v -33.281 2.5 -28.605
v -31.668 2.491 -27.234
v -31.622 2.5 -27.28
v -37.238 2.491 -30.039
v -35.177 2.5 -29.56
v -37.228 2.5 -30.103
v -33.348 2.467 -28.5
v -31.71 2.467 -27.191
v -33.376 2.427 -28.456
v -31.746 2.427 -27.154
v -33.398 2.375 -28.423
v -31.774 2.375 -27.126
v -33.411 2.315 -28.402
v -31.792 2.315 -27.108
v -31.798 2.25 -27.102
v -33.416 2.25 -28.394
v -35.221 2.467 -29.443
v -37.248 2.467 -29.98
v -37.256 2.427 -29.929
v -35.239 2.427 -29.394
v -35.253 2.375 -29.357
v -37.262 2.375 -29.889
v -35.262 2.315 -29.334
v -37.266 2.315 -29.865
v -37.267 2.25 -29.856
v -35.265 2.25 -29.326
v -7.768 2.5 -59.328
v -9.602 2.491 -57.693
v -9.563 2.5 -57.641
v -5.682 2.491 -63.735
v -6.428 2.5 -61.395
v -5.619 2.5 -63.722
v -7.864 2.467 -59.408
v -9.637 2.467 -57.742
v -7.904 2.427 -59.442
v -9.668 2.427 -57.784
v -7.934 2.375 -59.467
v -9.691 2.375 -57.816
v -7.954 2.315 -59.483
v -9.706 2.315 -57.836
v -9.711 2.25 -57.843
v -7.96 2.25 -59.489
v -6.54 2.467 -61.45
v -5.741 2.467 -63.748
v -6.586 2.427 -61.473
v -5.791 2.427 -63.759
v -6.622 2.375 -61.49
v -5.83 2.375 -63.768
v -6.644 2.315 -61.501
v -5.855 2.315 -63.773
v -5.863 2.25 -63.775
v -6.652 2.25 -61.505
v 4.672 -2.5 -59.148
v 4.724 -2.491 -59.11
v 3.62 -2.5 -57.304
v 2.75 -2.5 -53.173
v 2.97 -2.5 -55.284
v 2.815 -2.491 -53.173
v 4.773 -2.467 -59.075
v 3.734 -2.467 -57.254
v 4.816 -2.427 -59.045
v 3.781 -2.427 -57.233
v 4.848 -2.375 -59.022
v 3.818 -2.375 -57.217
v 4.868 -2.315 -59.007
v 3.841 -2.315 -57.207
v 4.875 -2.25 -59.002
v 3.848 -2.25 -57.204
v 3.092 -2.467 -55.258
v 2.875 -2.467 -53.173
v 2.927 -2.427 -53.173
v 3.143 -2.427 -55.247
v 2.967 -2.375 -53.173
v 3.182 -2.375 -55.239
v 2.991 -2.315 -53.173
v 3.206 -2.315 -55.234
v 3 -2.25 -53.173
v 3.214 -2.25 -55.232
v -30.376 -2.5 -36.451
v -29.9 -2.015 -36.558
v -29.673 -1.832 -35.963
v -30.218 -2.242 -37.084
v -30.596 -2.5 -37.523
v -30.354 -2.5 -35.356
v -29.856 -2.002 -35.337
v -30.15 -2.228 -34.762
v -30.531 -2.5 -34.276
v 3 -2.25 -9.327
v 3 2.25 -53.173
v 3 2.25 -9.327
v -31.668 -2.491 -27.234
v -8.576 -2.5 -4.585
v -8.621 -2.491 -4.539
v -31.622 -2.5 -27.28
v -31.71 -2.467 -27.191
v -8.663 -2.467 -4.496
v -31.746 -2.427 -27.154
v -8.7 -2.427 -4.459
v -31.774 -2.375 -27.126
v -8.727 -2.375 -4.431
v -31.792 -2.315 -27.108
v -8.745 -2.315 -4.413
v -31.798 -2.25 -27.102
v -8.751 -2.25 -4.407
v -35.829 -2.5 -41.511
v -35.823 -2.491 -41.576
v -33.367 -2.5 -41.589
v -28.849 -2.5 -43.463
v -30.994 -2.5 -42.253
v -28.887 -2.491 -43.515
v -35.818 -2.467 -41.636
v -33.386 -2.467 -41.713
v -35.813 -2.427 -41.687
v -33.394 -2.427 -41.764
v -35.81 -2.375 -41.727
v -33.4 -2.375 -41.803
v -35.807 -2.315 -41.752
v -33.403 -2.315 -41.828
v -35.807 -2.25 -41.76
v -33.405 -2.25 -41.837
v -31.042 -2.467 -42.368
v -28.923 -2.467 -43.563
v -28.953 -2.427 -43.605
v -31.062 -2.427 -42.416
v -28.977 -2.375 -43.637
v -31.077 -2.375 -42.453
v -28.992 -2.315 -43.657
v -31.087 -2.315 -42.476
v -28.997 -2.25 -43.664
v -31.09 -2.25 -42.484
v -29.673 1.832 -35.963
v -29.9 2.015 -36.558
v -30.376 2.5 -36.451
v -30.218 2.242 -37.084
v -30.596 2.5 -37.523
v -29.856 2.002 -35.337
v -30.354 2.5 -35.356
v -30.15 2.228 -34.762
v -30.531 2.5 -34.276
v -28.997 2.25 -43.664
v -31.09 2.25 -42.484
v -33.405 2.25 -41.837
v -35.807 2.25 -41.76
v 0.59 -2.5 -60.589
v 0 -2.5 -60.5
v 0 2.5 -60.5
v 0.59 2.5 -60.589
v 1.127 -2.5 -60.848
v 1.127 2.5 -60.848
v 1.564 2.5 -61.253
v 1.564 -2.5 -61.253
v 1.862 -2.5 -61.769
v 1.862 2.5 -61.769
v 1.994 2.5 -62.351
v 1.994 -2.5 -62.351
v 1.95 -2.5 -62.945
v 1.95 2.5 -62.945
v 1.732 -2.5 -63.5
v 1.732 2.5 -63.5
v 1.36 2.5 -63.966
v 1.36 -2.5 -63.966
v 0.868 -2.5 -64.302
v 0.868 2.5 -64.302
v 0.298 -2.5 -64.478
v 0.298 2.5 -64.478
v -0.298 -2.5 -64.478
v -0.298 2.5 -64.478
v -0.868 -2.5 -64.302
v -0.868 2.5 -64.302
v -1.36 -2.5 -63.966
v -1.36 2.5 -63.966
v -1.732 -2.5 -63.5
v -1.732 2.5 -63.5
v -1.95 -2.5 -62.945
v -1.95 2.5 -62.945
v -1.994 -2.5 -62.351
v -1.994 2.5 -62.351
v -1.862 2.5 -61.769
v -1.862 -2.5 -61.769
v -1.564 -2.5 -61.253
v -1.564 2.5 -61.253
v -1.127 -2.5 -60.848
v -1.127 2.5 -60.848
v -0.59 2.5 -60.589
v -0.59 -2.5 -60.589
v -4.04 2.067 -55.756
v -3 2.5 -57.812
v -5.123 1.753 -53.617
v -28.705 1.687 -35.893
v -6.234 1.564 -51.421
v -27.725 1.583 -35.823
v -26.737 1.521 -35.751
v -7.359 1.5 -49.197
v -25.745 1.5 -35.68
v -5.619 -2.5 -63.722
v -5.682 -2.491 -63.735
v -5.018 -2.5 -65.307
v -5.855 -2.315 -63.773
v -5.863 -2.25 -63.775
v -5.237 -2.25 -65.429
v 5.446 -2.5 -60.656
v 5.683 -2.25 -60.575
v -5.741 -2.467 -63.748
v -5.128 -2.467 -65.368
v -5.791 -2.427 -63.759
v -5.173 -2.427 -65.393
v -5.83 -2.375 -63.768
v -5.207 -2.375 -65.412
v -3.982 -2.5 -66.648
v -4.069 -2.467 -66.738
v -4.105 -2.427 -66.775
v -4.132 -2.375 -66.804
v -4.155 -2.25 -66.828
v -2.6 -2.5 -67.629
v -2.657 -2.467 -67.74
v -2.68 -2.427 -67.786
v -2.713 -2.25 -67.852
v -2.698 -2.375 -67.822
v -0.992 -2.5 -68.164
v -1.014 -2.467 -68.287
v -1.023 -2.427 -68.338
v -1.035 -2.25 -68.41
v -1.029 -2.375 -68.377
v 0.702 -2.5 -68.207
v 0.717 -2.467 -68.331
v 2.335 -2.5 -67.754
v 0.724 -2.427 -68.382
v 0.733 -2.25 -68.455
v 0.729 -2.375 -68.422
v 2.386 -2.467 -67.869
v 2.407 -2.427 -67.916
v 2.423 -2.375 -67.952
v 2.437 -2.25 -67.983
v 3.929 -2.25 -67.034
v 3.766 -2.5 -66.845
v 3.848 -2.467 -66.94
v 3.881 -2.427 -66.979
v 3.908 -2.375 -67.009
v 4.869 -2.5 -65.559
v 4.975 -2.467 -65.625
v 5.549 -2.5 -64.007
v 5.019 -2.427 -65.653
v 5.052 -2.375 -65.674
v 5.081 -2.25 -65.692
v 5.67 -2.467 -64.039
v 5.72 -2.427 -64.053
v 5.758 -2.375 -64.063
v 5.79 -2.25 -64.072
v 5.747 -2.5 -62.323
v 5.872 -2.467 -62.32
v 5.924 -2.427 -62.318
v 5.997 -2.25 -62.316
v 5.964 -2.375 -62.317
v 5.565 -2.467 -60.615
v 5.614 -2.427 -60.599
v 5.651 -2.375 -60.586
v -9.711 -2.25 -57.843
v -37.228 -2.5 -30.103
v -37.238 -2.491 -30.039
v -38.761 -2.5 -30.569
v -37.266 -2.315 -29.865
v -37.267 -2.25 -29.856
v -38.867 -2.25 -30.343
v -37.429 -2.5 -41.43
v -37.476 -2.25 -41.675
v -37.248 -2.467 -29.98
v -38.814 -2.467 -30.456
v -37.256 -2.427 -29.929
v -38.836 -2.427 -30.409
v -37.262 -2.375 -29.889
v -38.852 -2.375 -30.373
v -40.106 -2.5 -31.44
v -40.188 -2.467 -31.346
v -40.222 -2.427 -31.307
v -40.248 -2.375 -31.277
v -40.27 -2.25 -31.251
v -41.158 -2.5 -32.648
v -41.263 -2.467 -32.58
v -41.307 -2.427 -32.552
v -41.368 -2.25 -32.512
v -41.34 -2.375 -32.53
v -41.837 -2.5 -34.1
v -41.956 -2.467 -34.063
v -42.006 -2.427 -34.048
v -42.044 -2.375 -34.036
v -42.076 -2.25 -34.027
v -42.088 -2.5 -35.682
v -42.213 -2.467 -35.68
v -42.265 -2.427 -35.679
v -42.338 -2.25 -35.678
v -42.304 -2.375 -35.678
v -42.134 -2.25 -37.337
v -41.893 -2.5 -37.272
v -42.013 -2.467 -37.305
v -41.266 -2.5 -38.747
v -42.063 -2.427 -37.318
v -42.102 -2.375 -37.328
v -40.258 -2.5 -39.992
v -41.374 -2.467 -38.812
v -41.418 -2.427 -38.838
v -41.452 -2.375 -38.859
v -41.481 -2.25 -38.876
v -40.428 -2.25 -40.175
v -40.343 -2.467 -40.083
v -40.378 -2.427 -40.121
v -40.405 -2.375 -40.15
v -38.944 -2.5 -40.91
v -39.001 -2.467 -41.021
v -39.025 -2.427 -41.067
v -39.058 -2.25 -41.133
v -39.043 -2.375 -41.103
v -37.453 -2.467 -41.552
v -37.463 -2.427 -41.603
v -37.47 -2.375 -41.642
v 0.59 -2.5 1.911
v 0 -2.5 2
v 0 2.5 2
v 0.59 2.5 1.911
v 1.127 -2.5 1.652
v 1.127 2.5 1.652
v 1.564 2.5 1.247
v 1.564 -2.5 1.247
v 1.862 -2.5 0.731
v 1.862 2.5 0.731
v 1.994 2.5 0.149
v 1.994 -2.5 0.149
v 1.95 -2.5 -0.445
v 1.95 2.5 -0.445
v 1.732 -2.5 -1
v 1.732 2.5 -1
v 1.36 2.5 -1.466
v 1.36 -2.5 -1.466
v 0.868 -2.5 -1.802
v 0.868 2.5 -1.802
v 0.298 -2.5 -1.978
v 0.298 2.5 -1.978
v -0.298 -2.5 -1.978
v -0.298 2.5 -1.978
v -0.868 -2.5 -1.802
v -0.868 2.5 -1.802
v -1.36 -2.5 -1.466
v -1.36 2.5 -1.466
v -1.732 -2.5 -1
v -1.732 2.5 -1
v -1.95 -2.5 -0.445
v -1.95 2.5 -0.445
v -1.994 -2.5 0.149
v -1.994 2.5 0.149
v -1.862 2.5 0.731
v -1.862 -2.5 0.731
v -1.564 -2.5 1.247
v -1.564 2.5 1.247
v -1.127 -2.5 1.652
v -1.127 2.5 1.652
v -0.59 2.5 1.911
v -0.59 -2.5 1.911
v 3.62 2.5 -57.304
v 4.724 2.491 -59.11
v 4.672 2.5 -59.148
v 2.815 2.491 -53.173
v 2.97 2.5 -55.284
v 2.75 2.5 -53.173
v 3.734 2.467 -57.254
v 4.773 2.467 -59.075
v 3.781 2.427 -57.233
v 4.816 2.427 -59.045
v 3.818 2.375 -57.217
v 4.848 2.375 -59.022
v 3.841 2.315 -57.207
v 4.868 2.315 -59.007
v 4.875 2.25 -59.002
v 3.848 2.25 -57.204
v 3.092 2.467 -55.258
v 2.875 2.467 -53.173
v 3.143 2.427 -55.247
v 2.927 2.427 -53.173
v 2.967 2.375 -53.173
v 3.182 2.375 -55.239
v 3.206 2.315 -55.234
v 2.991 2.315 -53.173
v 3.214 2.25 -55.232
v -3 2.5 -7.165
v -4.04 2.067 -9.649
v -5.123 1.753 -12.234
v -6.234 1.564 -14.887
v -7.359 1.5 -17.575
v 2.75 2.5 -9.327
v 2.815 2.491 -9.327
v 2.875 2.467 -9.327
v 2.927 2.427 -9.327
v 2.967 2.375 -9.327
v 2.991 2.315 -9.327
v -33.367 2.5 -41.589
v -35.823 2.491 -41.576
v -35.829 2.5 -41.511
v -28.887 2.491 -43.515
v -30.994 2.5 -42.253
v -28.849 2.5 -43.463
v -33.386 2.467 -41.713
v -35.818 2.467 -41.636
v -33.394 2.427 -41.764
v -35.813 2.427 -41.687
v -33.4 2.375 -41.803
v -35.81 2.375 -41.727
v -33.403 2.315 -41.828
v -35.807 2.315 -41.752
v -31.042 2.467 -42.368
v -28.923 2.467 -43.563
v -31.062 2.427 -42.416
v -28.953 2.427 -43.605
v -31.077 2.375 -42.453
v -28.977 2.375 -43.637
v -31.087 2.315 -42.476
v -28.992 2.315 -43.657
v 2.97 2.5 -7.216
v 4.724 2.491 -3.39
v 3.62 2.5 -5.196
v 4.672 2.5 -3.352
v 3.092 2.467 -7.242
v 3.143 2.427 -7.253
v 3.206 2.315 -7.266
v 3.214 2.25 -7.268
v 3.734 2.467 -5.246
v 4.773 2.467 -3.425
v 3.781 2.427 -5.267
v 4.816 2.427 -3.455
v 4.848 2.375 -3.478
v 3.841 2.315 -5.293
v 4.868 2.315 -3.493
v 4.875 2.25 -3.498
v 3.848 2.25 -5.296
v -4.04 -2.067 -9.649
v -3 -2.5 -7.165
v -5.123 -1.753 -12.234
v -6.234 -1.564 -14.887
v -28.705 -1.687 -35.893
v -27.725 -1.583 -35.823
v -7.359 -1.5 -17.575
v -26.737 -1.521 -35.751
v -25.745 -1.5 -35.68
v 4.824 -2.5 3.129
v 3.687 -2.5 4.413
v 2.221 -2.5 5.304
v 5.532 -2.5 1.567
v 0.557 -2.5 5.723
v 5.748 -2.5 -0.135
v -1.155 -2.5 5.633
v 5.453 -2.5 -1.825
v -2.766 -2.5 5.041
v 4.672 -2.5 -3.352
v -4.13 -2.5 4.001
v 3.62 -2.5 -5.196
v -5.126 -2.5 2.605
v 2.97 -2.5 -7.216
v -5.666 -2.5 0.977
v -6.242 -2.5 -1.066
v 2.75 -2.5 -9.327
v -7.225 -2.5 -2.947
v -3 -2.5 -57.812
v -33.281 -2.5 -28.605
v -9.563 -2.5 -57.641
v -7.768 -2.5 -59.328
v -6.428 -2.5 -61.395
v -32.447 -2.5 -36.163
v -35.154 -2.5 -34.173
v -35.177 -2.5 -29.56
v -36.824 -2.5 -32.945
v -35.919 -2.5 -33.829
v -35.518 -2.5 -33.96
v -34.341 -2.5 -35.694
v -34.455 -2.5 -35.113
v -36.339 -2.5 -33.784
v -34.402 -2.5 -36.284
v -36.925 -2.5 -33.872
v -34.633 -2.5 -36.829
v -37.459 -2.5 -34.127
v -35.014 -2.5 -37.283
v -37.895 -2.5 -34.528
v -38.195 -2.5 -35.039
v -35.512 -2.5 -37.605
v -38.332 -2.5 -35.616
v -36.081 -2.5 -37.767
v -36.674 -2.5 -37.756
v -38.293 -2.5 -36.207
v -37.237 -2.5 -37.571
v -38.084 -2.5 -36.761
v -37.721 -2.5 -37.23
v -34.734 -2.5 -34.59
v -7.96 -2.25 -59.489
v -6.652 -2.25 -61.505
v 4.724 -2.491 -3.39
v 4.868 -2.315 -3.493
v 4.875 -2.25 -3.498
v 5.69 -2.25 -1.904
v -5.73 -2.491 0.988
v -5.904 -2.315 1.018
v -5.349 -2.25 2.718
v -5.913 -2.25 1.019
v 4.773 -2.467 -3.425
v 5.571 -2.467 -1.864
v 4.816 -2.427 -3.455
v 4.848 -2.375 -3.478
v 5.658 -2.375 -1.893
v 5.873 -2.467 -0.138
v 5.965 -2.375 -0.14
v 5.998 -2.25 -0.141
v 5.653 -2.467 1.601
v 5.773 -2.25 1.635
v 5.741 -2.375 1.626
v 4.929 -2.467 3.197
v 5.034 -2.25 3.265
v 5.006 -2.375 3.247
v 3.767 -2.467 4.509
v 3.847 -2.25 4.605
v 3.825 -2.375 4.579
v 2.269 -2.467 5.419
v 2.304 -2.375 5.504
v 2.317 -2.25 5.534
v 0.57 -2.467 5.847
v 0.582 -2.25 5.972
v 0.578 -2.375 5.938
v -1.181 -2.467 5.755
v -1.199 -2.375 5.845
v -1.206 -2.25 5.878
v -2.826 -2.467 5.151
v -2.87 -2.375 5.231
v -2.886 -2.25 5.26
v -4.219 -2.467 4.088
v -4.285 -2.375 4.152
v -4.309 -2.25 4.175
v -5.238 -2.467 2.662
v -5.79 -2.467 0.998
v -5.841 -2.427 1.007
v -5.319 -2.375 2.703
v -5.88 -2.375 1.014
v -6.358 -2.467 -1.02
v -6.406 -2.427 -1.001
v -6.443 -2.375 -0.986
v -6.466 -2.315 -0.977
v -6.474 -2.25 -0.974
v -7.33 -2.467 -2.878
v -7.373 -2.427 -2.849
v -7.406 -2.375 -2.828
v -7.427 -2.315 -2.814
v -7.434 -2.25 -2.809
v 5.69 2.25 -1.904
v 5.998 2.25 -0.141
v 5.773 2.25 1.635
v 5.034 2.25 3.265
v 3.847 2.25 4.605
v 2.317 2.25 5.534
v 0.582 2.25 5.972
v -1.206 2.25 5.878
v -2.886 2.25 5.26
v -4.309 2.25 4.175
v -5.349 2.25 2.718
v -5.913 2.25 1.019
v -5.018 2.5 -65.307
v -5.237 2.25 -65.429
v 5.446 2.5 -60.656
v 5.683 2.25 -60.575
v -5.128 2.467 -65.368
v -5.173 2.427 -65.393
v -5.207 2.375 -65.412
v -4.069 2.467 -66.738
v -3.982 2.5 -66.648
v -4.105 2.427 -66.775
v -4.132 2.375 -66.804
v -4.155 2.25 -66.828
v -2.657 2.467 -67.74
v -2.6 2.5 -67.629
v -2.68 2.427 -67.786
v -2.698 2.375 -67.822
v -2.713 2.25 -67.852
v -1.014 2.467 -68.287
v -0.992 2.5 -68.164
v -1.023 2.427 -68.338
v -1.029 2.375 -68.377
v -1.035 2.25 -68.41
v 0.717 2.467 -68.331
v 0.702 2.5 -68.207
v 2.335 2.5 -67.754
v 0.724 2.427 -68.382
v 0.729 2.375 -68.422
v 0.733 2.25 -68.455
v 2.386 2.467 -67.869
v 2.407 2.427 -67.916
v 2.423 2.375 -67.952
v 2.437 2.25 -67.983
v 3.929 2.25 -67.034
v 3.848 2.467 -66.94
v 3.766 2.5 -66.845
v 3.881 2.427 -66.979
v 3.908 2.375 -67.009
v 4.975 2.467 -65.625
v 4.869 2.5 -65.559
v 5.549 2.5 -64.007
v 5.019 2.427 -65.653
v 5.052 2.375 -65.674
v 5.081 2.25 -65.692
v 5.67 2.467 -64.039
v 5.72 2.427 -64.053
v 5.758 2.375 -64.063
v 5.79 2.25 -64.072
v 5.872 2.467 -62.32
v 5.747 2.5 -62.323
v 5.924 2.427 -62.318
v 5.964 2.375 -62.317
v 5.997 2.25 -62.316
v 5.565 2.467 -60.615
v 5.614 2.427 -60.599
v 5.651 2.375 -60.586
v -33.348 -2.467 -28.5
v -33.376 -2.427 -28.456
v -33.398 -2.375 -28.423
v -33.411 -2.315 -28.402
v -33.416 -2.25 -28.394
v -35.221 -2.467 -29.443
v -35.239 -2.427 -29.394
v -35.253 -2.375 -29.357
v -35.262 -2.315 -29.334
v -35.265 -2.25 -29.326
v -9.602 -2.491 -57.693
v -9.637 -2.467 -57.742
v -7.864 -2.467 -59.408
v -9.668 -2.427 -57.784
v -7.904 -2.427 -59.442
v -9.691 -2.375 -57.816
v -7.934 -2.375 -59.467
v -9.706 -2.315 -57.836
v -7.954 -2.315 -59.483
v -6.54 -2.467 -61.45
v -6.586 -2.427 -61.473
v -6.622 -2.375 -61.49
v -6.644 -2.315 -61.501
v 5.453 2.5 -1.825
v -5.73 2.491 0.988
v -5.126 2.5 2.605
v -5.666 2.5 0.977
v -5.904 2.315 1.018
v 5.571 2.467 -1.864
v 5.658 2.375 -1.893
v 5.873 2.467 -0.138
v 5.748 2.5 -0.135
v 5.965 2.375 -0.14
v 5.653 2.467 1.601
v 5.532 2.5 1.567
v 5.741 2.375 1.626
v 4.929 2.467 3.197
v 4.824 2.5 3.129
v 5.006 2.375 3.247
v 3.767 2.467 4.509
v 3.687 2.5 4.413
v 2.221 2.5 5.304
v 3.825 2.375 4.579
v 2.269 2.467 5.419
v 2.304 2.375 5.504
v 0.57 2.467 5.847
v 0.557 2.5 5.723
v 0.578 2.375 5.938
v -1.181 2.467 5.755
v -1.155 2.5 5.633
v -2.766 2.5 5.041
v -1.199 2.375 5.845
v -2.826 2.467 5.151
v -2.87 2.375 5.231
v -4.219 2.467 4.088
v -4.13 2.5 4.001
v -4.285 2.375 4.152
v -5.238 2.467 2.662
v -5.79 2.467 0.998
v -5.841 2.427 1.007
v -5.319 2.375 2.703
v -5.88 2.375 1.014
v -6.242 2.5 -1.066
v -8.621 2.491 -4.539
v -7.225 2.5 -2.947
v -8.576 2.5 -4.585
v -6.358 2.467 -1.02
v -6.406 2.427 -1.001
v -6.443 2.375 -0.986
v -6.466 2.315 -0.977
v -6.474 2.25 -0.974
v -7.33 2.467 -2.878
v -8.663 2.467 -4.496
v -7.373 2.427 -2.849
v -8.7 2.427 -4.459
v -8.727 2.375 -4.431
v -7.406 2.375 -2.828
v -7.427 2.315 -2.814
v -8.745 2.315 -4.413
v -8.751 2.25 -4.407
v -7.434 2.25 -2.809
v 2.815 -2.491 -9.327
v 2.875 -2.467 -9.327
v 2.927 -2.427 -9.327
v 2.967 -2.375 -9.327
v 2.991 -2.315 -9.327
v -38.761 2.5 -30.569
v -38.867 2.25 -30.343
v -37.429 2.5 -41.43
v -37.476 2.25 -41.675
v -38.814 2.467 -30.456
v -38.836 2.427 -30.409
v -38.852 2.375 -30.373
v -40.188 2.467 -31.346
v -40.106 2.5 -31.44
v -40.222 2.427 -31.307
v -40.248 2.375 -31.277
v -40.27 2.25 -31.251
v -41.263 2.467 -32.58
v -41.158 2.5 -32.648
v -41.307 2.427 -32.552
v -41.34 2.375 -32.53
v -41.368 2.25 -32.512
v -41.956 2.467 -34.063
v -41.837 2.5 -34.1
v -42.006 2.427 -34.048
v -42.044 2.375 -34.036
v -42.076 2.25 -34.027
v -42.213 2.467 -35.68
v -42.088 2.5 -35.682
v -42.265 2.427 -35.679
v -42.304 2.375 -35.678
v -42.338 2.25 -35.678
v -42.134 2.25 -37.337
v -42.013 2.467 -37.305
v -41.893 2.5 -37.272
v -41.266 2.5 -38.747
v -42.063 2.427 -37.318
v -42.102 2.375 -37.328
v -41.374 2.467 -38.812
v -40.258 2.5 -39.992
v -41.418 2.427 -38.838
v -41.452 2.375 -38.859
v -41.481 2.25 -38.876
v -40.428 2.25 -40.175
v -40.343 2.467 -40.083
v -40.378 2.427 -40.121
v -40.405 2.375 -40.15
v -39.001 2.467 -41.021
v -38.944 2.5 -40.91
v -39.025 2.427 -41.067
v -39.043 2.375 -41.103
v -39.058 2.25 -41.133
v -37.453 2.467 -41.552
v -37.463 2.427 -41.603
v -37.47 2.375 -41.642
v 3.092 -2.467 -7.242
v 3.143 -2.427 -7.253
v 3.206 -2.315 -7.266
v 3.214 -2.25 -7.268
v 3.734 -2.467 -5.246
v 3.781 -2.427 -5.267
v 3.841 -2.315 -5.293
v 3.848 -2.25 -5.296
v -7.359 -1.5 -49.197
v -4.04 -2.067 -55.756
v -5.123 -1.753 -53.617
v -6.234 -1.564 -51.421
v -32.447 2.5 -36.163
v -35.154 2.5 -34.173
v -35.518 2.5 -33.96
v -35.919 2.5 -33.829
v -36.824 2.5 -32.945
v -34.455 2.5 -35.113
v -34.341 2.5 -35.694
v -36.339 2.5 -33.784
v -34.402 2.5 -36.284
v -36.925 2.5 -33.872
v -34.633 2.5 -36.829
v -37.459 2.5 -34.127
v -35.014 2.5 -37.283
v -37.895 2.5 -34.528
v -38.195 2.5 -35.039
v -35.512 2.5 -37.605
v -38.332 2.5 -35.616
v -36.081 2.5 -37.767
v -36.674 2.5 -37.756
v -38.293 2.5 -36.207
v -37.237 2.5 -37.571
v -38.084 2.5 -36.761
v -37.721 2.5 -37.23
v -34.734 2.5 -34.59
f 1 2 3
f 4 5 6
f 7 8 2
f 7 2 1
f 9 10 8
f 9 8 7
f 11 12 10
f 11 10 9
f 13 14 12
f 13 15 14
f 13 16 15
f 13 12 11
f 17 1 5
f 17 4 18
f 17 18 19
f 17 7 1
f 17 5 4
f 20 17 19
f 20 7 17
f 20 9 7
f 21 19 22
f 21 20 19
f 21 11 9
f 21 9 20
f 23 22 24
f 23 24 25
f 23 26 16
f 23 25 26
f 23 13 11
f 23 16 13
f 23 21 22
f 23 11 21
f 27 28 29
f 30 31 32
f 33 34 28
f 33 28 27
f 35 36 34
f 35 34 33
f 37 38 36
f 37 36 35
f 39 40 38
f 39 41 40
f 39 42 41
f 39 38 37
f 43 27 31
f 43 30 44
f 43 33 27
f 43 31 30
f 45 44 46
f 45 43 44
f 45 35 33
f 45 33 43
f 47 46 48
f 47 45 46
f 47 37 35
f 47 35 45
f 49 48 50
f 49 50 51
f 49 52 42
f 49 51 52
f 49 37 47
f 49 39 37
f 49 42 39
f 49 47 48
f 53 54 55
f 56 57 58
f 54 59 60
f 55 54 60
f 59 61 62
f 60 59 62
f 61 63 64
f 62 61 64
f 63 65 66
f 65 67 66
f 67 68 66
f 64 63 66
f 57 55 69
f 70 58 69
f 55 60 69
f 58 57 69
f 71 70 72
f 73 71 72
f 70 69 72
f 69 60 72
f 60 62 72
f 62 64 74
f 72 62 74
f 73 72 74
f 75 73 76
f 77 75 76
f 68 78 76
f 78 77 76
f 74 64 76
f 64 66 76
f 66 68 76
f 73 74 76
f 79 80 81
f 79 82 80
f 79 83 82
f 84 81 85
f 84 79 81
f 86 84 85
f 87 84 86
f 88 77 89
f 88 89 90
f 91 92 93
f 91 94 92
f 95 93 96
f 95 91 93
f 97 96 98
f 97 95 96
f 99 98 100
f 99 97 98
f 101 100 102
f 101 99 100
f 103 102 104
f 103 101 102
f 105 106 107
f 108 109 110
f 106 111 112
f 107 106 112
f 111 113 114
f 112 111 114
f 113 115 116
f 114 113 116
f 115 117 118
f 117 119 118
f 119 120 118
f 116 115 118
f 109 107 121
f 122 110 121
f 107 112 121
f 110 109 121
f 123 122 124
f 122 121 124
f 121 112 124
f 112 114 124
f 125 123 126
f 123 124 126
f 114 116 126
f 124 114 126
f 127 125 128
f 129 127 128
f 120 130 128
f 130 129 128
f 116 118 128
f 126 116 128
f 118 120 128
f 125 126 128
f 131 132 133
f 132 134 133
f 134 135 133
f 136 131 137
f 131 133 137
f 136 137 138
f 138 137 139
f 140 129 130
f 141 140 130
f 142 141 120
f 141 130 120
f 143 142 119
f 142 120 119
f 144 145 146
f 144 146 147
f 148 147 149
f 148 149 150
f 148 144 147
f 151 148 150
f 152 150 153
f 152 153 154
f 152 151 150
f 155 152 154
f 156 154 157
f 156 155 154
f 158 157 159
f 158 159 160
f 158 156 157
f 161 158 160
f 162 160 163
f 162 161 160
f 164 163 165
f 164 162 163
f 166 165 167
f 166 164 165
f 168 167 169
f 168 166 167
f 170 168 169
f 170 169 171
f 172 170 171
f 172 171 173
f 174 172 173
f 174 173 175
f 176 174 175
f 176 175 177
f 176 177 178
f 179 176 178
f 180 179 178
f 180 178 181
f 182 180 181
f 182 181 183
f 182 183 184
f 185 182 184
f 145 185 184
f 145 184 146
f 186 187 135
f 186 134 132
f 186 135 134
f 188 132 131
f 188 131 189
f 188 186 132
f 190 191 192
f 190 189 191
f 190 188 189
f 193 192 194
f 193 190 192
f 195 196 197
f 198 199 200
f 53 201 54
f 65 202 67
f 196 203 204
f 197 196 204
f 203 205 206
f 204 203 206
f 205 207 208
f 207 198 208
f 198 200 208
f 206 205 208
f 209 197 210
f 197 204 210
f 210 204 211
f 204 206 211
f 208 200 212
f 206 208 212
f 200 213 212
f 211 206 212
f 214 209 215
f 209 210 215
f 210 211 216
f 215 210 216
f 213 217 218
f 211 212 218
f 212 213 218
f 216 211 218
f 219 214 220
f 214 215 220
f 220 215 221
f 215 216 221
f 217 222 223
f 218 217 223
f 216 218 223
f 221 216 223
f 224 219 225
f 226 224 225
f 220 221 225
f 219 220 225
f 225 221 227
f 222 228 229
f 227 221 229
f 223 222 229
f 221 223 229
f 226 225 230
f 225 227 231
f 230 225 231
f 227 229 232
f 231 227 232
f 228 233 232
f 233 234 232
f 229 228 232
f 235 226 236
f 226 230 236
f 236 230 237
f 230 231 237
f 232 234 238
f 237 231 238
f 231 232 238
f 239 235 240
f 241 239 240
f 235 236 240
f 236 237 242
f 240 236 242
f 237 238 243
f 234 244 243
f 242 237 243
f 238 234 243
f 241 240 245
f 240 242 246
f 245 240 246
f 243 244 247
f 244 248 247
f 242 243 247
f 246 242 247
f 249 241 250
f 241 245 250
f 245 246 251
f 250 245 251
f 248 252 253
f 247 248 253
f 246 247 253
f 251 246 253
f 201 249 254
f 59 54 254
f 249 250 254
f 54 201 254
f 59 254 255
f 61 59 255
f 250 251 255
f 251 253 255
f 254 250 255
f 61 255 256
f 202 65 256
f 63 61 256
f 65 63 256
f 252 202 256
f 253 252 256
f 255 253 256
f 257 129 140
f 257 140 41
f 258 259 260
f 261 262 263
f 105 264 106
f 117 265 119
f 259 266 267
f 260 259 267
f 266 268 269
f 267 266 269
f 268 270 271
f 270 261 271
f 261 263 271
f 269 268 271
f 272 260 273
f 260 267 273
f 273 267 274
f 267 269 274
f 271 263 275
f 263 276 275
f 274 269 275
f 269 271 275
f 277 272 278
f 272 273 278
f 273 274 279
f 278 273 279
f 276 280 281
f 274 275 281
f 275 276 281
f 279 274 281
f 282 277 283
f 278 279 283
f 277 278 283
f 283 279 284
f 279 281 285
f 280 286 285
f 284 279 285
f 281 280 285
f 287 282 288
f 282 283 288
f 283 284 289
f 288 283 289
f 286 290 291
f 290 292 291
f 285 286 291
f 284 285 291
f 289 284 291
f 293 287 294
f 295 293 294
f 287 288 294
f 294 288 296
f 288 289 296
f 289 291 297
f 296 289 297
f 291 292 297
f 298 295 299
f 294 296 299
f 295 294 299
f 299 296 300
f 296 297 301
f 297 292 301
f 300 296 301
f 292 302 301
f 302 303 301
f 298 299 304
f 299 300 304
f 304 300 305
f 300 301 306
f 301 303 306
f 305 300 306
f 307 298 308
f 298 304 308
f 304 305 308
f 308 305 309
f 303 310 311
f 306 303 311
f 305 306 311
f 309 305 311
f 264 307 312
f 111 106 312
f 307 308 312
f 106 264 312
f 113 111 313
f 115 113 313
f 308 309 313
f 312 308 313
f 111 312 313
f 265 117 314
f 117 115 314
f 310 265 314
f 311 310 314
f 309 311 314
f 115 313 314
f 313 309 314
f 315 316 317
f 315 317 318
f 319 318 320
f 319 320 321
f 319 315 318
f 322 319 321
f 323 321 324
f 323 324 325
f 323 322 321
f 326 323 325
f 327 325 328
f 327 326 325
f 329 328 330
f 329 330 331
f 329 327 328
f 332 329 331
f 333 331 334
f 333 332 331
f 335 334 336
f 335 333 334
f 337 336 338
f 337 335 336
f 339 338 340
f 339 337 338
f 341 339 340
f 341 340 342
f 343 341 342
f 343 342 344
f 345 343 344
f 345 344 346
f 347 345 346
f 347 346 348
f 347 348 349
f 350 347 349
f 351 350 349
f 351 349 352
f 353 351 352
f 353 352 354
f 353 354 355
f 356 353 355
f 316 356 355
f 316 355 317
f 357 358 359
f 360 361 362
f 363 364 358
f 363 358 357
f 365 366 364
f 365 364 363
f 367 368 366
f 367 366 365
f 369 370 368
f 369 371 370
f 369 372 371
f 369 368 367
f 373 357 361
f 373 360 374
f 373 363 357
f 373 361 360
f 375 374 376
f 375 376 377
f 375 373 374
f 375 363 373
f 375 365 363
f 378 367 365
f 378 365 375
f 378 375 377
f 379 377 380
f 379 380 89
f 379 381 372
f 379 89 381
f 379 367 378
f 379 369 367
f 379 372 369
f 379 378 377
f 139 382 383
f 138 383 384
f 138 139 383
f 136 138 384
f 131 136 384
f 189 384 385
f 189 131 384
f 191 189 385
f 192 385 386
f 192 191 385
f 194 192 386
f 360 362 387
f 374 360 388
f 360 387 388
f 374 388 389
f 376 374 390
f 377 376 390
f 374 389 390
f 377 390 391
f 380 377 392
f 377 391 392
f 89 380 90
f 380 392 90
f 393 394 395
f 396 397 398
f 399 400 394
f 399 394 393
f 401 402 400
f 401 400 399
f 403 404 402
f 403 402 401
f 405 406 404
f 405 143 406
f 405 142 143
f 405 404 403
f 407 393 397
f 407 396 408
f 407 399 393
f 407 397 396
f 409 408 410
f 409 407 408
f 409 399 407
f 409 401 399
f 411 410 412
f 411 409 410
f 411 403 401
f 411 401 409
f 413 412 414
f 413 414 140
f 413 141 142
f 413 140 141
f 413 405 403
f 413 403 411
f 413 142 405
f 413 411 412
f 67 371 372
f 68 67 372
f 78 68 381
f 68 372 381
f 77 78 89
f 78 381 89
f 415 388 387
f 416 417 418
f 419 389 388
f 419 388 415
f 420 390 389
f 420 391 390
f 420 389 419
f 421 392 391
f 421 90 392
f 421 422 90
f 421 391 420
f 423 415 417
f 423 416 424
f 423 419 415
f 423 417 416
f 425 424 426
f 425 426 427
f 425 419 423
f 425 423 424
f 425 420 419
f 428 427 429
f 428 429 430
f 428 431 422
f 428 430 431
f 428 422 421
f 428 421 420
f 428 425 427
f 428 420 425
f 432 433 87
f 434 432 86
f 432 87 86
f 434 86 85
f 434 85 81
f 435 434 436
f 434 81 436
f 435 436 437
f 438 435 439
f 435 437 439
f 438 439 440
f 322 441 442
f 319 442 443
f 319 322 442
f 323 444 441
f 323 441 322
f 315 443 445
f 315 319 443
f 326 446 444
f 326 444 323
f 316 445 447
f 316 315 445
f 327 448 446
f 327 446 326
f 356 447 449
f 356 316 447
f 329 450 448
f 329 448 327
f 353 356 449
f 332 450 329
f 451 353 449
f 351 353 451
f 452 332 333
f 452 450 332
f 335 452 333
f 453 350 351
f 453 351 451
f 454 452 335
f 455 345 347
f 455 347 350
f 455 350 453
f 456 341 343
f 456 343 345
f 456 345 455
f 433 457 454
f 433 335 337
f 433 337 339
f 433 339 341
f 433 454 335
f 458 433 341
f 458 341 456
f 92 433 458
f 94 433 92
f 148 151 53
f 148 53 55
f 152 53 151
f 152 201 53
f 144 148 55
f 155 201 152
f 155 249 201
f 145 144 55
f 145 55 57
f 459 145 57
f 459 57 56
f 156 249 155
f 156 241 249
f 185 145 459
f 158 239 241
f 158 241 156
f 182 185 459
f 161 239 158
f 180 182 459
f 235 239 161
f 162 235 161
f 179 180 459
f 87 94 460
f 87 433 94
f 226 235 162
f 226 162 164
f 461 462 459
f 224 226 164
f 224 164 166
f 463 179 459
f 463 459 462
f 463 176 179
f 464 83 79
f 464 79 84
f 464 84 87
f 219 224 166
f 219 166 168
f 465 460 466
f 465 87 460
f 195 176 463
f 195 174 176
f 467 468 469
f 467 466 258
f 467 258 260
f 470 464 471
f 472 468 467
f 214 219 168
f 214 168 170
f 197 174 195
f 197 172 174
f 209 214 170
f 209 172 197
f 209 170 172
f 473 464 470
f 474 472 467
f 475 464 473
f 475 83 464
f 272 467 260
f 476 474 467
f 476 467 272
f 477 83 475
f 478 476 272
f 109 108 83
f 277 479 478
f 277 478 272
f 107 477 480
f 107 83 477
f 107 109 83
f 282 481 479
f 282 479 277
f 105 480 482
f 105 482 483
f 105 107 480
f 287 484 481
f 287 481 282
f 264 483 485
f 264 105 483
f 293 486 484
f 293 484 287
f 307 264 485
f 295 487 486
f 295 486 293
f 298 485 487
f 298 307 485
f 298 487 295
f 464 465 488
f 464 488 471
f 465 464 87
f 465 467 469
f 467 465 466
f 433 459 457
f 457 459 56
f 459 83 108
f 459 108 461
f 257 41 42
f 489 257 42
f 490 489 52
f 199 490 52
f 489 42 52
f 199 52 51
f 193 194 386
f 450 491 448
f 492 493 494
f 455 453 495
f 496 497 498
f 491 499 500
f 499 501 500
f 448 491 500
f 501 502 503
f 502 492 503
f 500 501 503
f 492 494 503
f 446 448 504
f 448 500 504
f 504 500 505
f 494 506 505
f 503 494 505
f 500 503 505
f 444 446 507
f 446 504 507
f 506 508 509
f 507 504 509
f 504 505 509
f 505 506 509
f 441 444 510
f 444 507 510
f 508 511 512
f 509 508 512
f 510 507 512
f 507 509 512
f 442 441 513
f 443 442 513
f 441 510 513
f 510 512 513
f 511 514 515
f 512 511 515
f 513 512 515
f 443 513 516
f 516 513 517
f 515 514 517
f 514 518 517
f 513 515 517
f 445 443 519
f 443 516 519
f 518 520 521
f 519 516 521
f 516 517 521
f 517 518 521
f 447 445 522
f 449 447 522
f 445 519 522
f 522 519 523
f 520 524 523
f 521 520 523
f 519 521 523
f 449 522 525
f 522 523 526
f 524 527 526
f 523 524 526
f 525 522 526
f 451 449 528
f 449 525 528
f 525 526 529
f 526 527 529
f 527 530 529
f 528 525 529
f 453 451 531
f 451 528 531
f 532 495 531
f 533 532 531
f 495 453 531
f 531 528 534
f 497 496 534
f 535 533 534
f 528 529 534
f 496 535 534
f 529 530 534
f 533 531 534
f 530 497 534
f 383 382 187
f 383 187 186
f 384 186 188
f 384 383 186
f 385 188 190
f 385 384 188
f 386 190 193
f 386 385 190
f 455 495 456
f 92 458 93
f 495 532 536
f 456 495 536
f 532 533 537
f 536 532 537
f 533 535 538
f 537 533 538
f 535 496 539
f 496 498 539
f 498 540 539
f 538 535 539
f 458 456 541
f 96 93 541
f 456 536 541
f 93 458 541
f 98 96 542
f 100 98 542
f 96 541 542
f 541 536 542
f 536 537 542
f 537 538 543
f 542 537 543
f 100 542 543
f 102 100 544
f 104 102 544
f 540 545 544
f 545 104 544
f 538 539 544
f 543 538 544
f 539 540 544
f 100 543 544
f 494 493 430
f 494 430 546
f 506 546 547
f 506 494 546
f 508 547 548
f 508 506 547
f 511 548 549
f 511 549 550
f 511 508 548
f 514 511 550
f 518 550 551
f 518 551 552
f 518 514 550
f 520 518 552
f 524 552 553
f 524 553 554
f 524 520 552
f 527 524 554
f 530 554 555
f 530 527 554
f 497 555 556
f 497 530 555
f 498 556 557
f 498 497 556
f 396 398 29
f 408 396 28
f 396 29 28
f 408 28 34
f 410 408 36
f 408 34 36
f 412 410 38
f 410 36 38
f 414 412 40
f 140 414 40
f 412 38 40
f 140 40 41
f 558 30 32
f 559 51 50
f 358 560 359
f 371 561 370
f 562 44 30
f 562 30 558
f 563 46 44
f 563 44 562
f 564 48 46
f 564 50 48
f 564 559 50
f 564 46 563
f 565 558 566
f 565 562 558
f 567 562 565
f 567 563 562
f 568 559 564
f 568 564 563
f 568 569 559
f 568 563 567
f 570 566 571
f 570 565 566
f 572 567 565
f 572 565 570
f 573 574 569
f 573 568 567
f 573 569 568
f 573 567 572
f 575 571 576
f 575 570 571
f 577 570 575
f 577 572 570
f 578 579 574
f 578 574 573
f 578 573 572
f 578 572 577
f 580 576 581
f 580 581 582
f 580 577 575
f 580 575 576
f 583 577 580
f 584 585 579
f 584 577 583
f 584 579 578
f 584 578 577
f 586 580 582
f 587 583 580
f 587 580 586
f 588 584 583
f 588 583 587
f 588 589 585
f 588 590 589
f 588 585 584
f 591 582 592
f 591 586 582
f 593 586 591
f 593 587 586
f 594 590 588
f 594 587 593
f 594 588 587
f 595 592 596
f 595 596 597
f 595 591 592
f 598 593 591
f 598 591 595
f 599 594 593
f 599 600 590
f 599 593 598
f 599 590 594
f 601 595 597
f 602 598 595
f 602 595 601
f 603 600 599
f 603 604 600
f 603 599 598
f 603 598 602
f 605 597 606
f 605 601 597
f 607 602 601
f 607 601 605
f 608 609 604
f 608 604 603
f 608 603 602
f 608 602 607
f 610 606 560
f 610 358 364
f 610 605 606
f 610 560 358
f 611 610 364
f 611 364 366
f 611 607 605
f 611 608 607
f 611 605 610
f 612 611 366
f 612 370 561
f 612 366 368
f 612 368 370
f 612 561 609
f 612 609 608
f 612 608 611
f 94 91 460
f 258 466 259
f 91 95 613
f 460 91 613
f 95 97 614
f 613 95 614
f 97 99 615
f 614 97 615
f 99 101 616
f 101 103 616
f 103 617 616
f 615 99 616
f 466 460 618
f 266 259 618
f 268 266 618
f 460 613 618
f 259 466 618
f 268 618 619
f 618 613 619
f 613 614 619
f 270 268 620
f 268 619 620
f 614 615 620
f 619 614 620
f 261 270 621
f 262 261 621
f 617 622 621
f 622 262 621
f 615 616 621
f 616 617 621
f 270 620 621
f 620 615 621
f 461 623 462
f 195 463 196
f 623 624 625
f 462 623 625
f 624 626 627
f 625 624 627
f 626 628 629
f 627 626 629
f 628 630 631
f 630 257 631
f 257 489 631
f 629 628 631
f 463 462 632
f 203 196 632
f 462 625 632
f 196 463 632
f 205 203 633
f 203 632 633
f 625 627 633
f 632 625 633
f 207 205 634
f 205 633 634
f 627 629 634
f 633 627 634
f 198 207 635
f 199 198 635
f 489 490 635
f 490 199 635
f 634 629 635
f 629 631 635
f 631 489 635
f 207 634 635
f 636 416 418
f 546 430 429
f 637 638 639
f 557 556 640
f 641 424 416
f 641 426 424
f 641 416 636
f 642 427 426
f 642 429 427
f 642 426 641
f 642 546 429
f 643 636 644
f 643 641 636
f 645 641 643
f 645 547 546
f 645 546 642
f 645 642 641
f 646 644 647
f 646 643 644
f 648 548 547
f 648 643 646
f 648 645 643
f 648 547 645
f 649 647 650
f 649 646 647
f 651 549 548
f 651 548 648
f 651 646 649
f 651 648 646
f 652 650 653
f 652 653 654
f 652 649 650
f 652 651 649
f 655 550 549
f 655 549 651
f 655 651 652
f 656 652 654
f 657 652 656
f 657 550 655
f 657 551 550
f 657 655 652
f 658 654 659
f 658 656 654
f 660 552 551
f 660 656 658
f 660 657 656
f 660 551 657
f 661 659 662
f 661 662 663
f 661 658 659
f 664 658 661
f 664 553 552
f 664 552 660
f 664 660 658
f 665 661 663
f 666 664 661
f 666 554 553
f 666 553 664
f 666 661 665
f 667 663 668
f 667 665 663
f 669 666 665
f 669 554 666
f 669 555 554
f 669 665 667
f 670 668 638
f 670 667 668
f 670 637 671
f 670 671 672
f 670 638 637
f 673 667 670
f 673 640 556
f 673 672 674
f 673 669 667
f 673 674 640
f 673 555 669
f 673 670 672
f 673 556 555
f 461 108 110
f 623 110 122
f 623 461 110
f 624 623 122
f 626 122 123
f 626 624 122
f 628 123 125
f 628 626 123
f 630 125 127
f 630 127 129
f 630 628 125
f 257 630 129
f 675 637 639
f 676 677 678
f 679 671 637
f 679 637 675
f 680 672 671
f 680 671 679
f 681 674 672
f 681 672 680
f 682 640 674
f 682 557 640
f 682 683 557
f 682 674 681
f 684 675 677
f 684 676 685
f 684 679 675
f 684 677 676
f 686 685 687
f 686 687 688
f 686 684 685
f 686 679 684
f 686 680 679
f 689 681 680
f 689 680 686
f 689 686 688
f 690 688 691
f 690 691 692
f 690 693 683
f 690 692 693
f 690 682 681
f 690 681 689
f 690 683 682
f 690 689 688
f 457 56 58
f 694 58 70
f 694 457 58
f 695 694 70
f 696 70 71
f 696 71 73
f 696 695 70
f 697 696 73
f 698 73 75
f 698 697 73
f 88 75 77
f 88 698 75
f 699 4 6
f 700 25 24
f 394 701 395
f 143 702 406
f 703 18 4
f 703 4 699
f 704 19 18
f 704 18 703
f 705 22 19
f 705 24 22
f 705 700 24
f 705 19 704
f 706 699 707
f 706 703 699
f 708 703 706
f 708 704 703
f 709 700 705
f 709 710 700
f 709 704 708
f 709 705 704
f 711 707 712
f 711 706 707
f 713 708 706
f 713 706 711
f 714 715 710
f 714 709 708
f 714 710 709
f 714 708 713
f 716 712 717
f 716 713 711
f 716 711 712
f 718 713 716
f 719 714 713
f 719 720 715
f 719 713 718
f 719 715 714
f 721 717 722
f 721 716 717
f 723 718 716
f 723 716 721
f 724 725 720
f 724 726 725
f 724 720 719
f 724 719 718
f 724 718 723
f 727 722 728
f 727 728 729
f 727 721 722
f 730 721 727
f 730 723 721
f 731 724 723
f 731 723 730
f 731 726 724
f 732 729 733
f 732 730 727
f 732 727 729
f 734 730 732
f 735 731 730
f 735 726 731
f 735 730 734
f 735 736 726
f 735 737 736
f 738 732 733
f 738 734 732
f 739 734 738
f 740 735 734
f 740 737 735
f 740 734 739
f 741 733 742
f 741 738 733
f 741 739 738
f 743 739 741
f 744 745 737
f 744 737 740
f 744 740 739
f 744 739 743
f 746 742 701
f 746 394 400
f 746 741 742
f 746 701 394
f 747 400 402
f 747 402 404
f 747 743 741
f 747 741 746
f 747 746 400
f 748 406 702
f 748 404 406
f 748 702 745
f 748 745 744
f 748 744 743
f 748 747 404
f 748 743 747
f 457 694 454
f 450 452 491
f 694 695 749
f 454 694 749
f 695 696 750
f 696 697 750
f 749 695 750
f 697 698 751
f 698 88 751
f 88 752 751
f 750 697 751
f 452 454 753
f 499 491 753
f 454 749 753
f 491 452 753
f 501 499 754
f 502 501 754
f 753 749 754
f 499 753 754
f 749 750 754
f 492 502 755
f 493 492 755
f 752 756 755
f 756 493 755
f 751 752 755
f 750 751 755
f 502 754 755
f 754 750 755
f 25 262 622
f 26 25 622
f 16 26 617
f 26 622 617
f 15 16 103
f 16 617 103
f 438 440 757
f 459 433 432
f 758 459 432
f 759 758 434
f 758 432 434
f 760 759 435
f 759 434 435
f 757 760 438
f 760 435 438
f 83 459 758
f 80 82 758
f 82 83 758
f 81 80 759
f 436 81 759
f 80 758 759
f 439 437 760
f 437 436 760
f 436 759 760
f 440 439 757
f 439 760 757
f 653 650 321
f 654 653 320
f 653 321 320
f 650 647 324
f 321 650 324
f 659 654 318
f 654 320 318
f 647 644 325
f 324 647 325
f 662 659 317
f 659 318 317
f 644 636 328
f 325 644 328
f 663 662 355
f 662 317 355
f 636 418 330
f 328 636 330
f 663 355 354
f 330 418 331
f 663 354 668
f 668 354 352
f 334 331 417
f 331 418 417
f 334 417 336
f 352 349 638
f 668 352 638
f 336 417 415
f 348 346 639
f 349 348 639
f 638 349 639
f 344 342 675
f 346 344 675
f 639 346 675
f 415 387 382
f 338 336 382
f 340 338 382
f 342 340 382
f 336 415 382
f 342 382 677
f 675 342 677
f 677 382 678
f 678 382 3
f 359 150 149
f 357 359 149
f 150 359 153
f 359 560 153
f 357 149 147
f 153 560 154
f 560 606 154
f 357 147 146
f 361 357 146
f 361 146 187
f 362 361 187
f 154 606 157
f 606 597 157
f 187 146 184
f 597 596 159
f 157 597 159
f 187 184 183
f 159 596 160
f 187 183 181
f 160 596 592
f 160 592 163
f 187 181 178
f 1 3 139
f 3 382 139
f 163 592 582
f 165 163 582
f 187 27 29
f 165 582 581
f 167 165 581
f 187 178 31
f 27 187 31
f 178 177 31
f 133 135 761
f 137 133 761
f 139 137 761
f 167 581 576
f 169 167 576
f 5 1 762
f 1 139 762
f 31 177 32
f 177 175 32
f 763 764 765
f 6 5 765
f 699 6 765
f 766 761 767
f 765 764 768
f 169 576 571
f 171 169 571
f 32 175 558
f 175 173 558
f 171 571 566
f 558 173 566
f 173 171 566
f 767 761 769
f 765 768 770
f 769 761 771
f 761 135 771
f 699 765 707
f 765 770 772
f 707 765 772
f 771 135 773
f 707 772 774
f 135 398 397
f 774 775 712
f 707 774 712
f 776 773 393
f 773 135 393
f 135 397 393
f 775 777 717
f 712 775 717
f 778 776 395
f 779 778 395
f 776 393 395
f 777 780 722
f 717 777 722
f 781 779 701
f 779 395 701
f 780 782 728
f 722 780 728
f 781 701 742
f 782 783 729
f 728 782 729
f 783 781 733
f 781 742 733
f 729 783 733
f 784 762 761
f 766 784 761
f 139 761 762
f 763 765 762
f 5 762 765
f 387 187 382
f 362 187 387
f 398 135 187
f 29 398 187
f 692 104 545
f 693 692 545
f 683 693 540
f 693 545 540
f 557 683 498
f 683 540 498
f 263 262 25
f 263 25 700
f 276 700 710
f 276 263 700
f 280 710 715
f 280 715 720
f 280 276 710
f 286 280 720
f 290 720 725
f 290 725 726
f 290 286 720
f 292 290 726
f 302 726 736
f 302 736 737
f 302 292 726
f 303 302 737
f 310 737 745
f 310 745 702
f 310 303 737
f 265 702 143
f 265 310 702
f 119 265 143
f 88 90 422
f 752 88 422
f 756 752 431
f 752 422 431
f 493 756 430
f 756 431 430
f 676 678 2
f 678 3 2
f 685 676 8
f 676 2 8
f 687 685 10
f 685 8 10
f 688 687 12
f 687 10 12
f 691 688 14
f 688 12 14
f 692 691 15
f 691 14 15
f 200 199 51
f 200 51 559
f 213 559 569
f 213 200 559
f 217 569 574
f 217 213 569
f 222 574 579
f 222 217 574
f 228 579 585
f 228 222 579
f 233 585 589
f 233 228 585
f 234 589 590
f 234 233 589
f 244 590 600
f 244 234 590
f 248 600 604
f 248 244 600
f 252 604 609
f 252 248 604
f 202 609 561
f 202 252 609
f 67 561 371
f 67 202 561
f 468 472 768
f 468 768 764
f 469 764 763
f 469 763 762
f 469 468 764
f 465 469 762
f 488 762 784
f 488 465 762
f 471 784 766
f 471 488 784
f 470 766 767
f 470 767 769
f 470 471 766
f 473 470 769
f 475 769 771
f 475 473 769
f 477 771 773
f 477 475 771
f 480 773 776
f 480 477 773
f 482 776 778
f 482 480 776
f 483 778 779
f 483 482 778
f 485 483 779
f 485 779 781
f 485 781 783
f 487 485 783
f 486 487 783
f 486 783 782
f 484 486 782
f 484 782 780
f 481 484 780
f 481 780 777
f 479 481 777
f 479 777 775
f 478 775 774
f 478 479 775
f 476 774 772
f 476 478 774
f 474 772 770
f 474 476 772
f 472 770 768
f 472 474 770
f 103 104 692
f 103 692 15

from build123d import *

# Parameters (mm, degrees)
BOSS_EXTRUDE1_DEPTH = 2.5
SKETCH6_R           = 2
CUT_EXTRUDE2_DEPTH  = 81.683428275
FILLET1_R           = 10
FILLET2_R           = 0.25
CUT_EXTRUDE3_DEPTH  = 1
CUT_EXTRUDE3_DRAFT  = -45
FILLET3_R           = 10


# Read off the part's stored shape, not the designer's step: Mirror1
with BuildPart() as part:
    # Sketch5 → Boss-Extrude1 (new, symmetric)
    with BuildSketch(Plane(origin=(0, 0, 0), x_dir=(1, 0, 0), z_dir=(0, 1, 0))):
        with BuildLine():
            Line((-32.965704319, 40.746204167), (-5.742345952, 60.760614197))
            ThreePointArc((-5.742345952, 60.760614197), (2.206223968, 68.07965732), (3, 57.303847577))
            Line((3, 57.303847577), (3, 5.196152423))
            ThreePointArc((3, 5.196152423), (2.317397773, -5.534407607), (-5.807325554, 1.508300339))
            Line((-5.807325554, 1.508300339), (-34.741264584, 30.00061646))
            ThreePointArc((-34.741264584, 30.00061646), (-42.258431929, 36.762212041), (-32.965704319, 40.746204167))
        make_face()
    extrude(amount=BOSS_EXTRUDE1_DEPTH, both=True)

    # Sketch6 → Cut-Extrude2 (cut, through all)
    with BuildSketch(Plane(origin=(0, 2.5, 0), x_dir=(1, 0, 0), z_dir=(0, 1, 0))):
        with Locations(Location((-36.338700951, 35.784058087, 0), (0, 0, 270))):
            Circle(SKETCH6_R)
        with Locations(Location((0, 62.5, 0), (0, 0, 270))):
            Circle(SKETCH6_R)
        with Locations(Location((0, 0, 0), (0, 0, 270))):
            Circle(SKETCH6_R)
    extrude(amount=-CUT_EXTRUDE2_DEPTH, mode=Mode.SUBTRACT)

    # Fillet1
    fillet1_edges = [part.edges().sort_by_distance(p)[0] for p in [
        (3, 0, -57.303847577),
        (3, 0, -5.196152423),
        (-5.807325554, 0, -1.508300339),
        (-34.741264584, 0, -30.00061646),
        (-32.965704319, 0, -40.746204167),
        (-5.742345952, 0, -60.760614197),
    ]]
    fillet(fillet1_edges, radius=FILLET1_R)

    # Fillet2
    fillet2_edges = [part.edges().sort_by_distance(p)[0] for p in [
        (2.317397773, -2.5, 5.534407607),
        (2.317397773, 2.5, 5.534407607),
        (-20.274295069, -2.5, -15.754458399),
        (-20.274295069, 2.5, -15.754458399),
        (-42.294061571, -2.5, -36.514592059),
        (-42.294061571, 2.5, -36.514592059),
        (-19.354025135, -2.5, -50.753409182),
        (-19.354025135, 2.5, -50.753409182),
        (2.436899667, -2.5, -67.982838682),
        (2.436899667, 2.5, -67.982838682),
        (3, -2.5, -31.25),
        (3, 2.5, -31.25),
        (-6.906263042, -2.5, -1.916404592),
        (-6.906263042, 2.5, -1.916404592),
        (-34.316307366, -2.5, -28.908085432),
        (-34.316307366, 2.5, -28.908085432),
        (-32.227862875, -2.5, -42.090278775),
        (-32.227862875, 2.5, -42.090278775),
        (-7.245317265, -2.5, -60.457259979),
        (-7.245317265, 2.5, -60.457259979),
        (3.480283618, -2.5, -56.234483125),
        (3.480283618, 2.5, -56.234483125),
        (3.480283618, -2.5, -6.265516875),
        (3.480283618, 2.5, -6.265516875),
    ]]
    fillet(fillet2_edges, radius=FILLET2_R)


with BuildPart() as cut_extrude3_tool:
    # Sketch11 → Cut-Extrude3 (with draft: the straight prism first)
    with BuildSketch(Plane(origin=(0, 2.5, 0), x_dir=(1, 0, 0), z_dir=(0, 1, 0))):
        with BuildLine():
            ThreePointArc((-30.596355, 37.52344389), (-30.339901547, 35.904081877), (-30.531375397, 34.275757748))
            Line((-30.531375397, 34.275757748), (-3, 7.164597728))
            Line((-3, 7.164597728), (-3, 57.812078262))
            Line((-3, 57.812078262), (-30.596355, 37.52344389))
        make_face()
    extrude(amount=-CUT_EXTRUDE3_DEPTH)
    # Cut-Extrude3: the draft: its side faces are tilted about the plane it starts from
    cut_extrude3_sides = [cut_extrude3_tool.faces().sort_by_distance(p)[0] for p in [
        (-30.339901547, 2, -35.904081877),
        (-16.765687699, 2, -20.720177738),
        (-3, 2, -32.488337995),
        (-16.7981775, 2, -47.667761076),
    ]]
    draft(cut_extrude3_sides, Plane(origin=(0, 2.5, 0), x_dir=(1, 0, 0), z_dir=(0, 1, 0)), CUT_EXTRUDE3_DRAFT)


with BuildPart() as part_1:
    add(part.part)

    # Cut-Extrude3: cut by cut_extrude3_tool
    add(cut_extrude3_tool.part, mode=Mode.SUBTRACT)

    # Fillet3
    # the kernel refuses this fillet: 10 mm, written as the material it adds along each edge
    with BuildSketch(Plane(origin=(-35.422208483, 1.5, -40.495403727), x_dir=(-0.4961401986594238, 0.7071067811865456, 0.5038302325924777), z_dir=(0.712523548065871, 0, 0.701648197782637))) as fillet3_piece_1_section:
        with BuildLine():
            CenterArc((4.695967592, -9.446168032), FILLET3_R, 109.158067237, 25.841932763)
            Line((-2.37510022, -2.37510022), (0, 0))
            Line((0, 0), (1.414213562, 0))
        make_face()
    fillet3_piece_1 = extrude(amount=52.497135101, mode=Mode.PRIVATE)
    fillet3_piece_1 = split(fillet3_piece_1, bisect_by=Plane(origin=(-21.679167278, -8.239532903, -30.749685658), z_dir=(0.4188457426606433, 0.7071067811865488, 0.5697089115110034)), keep=Keep.TOP, mode=Mode.PRIVATE)
    fillet3_piece_1 = split(fillet3_piece_1, bisect_by=Plane(origin=(-9.768964958, -4.268964958, -22.714341228), z_dir=(-0.7071067811865462, 0.7071067811865488, 0)), keep=Keep.TOP, mode=Mode.PRIVATE)
    add(fillet3_piece_1)
    with BuildSketch(Plane(origin=(2.765578806, 1.5, -60.809716743), x_dir=(-0.4188457426606457, 0.7071067811865447, -0.5697089115110068), z_dir=(-0.805690069263676, 0, 0.5923373298129141))) as fillet3_piece_2_section:
        with BuildLine():
            CenterArc((4.695967592, -9.446168032), FILLET3_R, 109.158067237, 25.841932763)
            Line((-2.37510022, -2.37510022), (0, 0))
            Line((0, 0), (1.414213562, 0))
        make_face()
    fillet3_piece_2 = extrude(amount=48.40225373, mode=Mode.PRIVATE)
    fillet3_piece_2 = split(fillet3_piece_2, bisect_by=Plane(origin=(-9.835247725, -4.335247725, -45.695753356), z_dir=(-0.7071067811865462, 0.7071067811865488, 0)), keep=Keep.TOP, mode=Mode.PRIVATE)
    add(fillet3_piece_2)
    with BuildSketch(Plane(origin=(-4, 1.5, -1.155549611), x_dir=(0.7071067811865488, 0.7071067811865462, 0), z_dir=(0, 0, -1))) as fillet3_piece_3_section:
        with BuildLine():
            CenterArc((4.695967592, -9.446168032), FILLET3_R, 109.158067237, 25.841932763)
            Line((-2.37510022, -2.37510022), (0, 0))
            Line((0, 0), (1.414213562, 0))
        make_face()
    fillet3_piece_3 = extrude(amount=63.077411412, mode=Mode.PRIVATE)
    fillet3_piece_3 = split(fillet3_piece_3, bisect_by=Plane(origin=(-10.603901171, -7.527129797, -39.776353526), z_dir=(0.4188457426606433, 0.7071067811865488, 0.5697089115110034)), keep=Keep.TOP, mode=Mode.PRIVATE)
    fillet3_piece_3 = split(fillet3_piece_3, bisect_by=Plane(origin=(-10.614934948, -6.100094299, -26.733213697), z_dir=(0.49614019865942166, 0.7071067811865488, -0.5038302325924754)), keep=Keep.TOP, mode=Mode.PRIVATE)
    add(fillet3_piece_3)

    # Mirror1
    split(bisect_by=Plane.ZX, keep=Keep.TOP)

    # Mirror1 2: part across plane


with BuildPart() as part_2:
    add(part_1.part)
    add(part_1.part.mirror(Plane.ZX))


solid = part_2.part
